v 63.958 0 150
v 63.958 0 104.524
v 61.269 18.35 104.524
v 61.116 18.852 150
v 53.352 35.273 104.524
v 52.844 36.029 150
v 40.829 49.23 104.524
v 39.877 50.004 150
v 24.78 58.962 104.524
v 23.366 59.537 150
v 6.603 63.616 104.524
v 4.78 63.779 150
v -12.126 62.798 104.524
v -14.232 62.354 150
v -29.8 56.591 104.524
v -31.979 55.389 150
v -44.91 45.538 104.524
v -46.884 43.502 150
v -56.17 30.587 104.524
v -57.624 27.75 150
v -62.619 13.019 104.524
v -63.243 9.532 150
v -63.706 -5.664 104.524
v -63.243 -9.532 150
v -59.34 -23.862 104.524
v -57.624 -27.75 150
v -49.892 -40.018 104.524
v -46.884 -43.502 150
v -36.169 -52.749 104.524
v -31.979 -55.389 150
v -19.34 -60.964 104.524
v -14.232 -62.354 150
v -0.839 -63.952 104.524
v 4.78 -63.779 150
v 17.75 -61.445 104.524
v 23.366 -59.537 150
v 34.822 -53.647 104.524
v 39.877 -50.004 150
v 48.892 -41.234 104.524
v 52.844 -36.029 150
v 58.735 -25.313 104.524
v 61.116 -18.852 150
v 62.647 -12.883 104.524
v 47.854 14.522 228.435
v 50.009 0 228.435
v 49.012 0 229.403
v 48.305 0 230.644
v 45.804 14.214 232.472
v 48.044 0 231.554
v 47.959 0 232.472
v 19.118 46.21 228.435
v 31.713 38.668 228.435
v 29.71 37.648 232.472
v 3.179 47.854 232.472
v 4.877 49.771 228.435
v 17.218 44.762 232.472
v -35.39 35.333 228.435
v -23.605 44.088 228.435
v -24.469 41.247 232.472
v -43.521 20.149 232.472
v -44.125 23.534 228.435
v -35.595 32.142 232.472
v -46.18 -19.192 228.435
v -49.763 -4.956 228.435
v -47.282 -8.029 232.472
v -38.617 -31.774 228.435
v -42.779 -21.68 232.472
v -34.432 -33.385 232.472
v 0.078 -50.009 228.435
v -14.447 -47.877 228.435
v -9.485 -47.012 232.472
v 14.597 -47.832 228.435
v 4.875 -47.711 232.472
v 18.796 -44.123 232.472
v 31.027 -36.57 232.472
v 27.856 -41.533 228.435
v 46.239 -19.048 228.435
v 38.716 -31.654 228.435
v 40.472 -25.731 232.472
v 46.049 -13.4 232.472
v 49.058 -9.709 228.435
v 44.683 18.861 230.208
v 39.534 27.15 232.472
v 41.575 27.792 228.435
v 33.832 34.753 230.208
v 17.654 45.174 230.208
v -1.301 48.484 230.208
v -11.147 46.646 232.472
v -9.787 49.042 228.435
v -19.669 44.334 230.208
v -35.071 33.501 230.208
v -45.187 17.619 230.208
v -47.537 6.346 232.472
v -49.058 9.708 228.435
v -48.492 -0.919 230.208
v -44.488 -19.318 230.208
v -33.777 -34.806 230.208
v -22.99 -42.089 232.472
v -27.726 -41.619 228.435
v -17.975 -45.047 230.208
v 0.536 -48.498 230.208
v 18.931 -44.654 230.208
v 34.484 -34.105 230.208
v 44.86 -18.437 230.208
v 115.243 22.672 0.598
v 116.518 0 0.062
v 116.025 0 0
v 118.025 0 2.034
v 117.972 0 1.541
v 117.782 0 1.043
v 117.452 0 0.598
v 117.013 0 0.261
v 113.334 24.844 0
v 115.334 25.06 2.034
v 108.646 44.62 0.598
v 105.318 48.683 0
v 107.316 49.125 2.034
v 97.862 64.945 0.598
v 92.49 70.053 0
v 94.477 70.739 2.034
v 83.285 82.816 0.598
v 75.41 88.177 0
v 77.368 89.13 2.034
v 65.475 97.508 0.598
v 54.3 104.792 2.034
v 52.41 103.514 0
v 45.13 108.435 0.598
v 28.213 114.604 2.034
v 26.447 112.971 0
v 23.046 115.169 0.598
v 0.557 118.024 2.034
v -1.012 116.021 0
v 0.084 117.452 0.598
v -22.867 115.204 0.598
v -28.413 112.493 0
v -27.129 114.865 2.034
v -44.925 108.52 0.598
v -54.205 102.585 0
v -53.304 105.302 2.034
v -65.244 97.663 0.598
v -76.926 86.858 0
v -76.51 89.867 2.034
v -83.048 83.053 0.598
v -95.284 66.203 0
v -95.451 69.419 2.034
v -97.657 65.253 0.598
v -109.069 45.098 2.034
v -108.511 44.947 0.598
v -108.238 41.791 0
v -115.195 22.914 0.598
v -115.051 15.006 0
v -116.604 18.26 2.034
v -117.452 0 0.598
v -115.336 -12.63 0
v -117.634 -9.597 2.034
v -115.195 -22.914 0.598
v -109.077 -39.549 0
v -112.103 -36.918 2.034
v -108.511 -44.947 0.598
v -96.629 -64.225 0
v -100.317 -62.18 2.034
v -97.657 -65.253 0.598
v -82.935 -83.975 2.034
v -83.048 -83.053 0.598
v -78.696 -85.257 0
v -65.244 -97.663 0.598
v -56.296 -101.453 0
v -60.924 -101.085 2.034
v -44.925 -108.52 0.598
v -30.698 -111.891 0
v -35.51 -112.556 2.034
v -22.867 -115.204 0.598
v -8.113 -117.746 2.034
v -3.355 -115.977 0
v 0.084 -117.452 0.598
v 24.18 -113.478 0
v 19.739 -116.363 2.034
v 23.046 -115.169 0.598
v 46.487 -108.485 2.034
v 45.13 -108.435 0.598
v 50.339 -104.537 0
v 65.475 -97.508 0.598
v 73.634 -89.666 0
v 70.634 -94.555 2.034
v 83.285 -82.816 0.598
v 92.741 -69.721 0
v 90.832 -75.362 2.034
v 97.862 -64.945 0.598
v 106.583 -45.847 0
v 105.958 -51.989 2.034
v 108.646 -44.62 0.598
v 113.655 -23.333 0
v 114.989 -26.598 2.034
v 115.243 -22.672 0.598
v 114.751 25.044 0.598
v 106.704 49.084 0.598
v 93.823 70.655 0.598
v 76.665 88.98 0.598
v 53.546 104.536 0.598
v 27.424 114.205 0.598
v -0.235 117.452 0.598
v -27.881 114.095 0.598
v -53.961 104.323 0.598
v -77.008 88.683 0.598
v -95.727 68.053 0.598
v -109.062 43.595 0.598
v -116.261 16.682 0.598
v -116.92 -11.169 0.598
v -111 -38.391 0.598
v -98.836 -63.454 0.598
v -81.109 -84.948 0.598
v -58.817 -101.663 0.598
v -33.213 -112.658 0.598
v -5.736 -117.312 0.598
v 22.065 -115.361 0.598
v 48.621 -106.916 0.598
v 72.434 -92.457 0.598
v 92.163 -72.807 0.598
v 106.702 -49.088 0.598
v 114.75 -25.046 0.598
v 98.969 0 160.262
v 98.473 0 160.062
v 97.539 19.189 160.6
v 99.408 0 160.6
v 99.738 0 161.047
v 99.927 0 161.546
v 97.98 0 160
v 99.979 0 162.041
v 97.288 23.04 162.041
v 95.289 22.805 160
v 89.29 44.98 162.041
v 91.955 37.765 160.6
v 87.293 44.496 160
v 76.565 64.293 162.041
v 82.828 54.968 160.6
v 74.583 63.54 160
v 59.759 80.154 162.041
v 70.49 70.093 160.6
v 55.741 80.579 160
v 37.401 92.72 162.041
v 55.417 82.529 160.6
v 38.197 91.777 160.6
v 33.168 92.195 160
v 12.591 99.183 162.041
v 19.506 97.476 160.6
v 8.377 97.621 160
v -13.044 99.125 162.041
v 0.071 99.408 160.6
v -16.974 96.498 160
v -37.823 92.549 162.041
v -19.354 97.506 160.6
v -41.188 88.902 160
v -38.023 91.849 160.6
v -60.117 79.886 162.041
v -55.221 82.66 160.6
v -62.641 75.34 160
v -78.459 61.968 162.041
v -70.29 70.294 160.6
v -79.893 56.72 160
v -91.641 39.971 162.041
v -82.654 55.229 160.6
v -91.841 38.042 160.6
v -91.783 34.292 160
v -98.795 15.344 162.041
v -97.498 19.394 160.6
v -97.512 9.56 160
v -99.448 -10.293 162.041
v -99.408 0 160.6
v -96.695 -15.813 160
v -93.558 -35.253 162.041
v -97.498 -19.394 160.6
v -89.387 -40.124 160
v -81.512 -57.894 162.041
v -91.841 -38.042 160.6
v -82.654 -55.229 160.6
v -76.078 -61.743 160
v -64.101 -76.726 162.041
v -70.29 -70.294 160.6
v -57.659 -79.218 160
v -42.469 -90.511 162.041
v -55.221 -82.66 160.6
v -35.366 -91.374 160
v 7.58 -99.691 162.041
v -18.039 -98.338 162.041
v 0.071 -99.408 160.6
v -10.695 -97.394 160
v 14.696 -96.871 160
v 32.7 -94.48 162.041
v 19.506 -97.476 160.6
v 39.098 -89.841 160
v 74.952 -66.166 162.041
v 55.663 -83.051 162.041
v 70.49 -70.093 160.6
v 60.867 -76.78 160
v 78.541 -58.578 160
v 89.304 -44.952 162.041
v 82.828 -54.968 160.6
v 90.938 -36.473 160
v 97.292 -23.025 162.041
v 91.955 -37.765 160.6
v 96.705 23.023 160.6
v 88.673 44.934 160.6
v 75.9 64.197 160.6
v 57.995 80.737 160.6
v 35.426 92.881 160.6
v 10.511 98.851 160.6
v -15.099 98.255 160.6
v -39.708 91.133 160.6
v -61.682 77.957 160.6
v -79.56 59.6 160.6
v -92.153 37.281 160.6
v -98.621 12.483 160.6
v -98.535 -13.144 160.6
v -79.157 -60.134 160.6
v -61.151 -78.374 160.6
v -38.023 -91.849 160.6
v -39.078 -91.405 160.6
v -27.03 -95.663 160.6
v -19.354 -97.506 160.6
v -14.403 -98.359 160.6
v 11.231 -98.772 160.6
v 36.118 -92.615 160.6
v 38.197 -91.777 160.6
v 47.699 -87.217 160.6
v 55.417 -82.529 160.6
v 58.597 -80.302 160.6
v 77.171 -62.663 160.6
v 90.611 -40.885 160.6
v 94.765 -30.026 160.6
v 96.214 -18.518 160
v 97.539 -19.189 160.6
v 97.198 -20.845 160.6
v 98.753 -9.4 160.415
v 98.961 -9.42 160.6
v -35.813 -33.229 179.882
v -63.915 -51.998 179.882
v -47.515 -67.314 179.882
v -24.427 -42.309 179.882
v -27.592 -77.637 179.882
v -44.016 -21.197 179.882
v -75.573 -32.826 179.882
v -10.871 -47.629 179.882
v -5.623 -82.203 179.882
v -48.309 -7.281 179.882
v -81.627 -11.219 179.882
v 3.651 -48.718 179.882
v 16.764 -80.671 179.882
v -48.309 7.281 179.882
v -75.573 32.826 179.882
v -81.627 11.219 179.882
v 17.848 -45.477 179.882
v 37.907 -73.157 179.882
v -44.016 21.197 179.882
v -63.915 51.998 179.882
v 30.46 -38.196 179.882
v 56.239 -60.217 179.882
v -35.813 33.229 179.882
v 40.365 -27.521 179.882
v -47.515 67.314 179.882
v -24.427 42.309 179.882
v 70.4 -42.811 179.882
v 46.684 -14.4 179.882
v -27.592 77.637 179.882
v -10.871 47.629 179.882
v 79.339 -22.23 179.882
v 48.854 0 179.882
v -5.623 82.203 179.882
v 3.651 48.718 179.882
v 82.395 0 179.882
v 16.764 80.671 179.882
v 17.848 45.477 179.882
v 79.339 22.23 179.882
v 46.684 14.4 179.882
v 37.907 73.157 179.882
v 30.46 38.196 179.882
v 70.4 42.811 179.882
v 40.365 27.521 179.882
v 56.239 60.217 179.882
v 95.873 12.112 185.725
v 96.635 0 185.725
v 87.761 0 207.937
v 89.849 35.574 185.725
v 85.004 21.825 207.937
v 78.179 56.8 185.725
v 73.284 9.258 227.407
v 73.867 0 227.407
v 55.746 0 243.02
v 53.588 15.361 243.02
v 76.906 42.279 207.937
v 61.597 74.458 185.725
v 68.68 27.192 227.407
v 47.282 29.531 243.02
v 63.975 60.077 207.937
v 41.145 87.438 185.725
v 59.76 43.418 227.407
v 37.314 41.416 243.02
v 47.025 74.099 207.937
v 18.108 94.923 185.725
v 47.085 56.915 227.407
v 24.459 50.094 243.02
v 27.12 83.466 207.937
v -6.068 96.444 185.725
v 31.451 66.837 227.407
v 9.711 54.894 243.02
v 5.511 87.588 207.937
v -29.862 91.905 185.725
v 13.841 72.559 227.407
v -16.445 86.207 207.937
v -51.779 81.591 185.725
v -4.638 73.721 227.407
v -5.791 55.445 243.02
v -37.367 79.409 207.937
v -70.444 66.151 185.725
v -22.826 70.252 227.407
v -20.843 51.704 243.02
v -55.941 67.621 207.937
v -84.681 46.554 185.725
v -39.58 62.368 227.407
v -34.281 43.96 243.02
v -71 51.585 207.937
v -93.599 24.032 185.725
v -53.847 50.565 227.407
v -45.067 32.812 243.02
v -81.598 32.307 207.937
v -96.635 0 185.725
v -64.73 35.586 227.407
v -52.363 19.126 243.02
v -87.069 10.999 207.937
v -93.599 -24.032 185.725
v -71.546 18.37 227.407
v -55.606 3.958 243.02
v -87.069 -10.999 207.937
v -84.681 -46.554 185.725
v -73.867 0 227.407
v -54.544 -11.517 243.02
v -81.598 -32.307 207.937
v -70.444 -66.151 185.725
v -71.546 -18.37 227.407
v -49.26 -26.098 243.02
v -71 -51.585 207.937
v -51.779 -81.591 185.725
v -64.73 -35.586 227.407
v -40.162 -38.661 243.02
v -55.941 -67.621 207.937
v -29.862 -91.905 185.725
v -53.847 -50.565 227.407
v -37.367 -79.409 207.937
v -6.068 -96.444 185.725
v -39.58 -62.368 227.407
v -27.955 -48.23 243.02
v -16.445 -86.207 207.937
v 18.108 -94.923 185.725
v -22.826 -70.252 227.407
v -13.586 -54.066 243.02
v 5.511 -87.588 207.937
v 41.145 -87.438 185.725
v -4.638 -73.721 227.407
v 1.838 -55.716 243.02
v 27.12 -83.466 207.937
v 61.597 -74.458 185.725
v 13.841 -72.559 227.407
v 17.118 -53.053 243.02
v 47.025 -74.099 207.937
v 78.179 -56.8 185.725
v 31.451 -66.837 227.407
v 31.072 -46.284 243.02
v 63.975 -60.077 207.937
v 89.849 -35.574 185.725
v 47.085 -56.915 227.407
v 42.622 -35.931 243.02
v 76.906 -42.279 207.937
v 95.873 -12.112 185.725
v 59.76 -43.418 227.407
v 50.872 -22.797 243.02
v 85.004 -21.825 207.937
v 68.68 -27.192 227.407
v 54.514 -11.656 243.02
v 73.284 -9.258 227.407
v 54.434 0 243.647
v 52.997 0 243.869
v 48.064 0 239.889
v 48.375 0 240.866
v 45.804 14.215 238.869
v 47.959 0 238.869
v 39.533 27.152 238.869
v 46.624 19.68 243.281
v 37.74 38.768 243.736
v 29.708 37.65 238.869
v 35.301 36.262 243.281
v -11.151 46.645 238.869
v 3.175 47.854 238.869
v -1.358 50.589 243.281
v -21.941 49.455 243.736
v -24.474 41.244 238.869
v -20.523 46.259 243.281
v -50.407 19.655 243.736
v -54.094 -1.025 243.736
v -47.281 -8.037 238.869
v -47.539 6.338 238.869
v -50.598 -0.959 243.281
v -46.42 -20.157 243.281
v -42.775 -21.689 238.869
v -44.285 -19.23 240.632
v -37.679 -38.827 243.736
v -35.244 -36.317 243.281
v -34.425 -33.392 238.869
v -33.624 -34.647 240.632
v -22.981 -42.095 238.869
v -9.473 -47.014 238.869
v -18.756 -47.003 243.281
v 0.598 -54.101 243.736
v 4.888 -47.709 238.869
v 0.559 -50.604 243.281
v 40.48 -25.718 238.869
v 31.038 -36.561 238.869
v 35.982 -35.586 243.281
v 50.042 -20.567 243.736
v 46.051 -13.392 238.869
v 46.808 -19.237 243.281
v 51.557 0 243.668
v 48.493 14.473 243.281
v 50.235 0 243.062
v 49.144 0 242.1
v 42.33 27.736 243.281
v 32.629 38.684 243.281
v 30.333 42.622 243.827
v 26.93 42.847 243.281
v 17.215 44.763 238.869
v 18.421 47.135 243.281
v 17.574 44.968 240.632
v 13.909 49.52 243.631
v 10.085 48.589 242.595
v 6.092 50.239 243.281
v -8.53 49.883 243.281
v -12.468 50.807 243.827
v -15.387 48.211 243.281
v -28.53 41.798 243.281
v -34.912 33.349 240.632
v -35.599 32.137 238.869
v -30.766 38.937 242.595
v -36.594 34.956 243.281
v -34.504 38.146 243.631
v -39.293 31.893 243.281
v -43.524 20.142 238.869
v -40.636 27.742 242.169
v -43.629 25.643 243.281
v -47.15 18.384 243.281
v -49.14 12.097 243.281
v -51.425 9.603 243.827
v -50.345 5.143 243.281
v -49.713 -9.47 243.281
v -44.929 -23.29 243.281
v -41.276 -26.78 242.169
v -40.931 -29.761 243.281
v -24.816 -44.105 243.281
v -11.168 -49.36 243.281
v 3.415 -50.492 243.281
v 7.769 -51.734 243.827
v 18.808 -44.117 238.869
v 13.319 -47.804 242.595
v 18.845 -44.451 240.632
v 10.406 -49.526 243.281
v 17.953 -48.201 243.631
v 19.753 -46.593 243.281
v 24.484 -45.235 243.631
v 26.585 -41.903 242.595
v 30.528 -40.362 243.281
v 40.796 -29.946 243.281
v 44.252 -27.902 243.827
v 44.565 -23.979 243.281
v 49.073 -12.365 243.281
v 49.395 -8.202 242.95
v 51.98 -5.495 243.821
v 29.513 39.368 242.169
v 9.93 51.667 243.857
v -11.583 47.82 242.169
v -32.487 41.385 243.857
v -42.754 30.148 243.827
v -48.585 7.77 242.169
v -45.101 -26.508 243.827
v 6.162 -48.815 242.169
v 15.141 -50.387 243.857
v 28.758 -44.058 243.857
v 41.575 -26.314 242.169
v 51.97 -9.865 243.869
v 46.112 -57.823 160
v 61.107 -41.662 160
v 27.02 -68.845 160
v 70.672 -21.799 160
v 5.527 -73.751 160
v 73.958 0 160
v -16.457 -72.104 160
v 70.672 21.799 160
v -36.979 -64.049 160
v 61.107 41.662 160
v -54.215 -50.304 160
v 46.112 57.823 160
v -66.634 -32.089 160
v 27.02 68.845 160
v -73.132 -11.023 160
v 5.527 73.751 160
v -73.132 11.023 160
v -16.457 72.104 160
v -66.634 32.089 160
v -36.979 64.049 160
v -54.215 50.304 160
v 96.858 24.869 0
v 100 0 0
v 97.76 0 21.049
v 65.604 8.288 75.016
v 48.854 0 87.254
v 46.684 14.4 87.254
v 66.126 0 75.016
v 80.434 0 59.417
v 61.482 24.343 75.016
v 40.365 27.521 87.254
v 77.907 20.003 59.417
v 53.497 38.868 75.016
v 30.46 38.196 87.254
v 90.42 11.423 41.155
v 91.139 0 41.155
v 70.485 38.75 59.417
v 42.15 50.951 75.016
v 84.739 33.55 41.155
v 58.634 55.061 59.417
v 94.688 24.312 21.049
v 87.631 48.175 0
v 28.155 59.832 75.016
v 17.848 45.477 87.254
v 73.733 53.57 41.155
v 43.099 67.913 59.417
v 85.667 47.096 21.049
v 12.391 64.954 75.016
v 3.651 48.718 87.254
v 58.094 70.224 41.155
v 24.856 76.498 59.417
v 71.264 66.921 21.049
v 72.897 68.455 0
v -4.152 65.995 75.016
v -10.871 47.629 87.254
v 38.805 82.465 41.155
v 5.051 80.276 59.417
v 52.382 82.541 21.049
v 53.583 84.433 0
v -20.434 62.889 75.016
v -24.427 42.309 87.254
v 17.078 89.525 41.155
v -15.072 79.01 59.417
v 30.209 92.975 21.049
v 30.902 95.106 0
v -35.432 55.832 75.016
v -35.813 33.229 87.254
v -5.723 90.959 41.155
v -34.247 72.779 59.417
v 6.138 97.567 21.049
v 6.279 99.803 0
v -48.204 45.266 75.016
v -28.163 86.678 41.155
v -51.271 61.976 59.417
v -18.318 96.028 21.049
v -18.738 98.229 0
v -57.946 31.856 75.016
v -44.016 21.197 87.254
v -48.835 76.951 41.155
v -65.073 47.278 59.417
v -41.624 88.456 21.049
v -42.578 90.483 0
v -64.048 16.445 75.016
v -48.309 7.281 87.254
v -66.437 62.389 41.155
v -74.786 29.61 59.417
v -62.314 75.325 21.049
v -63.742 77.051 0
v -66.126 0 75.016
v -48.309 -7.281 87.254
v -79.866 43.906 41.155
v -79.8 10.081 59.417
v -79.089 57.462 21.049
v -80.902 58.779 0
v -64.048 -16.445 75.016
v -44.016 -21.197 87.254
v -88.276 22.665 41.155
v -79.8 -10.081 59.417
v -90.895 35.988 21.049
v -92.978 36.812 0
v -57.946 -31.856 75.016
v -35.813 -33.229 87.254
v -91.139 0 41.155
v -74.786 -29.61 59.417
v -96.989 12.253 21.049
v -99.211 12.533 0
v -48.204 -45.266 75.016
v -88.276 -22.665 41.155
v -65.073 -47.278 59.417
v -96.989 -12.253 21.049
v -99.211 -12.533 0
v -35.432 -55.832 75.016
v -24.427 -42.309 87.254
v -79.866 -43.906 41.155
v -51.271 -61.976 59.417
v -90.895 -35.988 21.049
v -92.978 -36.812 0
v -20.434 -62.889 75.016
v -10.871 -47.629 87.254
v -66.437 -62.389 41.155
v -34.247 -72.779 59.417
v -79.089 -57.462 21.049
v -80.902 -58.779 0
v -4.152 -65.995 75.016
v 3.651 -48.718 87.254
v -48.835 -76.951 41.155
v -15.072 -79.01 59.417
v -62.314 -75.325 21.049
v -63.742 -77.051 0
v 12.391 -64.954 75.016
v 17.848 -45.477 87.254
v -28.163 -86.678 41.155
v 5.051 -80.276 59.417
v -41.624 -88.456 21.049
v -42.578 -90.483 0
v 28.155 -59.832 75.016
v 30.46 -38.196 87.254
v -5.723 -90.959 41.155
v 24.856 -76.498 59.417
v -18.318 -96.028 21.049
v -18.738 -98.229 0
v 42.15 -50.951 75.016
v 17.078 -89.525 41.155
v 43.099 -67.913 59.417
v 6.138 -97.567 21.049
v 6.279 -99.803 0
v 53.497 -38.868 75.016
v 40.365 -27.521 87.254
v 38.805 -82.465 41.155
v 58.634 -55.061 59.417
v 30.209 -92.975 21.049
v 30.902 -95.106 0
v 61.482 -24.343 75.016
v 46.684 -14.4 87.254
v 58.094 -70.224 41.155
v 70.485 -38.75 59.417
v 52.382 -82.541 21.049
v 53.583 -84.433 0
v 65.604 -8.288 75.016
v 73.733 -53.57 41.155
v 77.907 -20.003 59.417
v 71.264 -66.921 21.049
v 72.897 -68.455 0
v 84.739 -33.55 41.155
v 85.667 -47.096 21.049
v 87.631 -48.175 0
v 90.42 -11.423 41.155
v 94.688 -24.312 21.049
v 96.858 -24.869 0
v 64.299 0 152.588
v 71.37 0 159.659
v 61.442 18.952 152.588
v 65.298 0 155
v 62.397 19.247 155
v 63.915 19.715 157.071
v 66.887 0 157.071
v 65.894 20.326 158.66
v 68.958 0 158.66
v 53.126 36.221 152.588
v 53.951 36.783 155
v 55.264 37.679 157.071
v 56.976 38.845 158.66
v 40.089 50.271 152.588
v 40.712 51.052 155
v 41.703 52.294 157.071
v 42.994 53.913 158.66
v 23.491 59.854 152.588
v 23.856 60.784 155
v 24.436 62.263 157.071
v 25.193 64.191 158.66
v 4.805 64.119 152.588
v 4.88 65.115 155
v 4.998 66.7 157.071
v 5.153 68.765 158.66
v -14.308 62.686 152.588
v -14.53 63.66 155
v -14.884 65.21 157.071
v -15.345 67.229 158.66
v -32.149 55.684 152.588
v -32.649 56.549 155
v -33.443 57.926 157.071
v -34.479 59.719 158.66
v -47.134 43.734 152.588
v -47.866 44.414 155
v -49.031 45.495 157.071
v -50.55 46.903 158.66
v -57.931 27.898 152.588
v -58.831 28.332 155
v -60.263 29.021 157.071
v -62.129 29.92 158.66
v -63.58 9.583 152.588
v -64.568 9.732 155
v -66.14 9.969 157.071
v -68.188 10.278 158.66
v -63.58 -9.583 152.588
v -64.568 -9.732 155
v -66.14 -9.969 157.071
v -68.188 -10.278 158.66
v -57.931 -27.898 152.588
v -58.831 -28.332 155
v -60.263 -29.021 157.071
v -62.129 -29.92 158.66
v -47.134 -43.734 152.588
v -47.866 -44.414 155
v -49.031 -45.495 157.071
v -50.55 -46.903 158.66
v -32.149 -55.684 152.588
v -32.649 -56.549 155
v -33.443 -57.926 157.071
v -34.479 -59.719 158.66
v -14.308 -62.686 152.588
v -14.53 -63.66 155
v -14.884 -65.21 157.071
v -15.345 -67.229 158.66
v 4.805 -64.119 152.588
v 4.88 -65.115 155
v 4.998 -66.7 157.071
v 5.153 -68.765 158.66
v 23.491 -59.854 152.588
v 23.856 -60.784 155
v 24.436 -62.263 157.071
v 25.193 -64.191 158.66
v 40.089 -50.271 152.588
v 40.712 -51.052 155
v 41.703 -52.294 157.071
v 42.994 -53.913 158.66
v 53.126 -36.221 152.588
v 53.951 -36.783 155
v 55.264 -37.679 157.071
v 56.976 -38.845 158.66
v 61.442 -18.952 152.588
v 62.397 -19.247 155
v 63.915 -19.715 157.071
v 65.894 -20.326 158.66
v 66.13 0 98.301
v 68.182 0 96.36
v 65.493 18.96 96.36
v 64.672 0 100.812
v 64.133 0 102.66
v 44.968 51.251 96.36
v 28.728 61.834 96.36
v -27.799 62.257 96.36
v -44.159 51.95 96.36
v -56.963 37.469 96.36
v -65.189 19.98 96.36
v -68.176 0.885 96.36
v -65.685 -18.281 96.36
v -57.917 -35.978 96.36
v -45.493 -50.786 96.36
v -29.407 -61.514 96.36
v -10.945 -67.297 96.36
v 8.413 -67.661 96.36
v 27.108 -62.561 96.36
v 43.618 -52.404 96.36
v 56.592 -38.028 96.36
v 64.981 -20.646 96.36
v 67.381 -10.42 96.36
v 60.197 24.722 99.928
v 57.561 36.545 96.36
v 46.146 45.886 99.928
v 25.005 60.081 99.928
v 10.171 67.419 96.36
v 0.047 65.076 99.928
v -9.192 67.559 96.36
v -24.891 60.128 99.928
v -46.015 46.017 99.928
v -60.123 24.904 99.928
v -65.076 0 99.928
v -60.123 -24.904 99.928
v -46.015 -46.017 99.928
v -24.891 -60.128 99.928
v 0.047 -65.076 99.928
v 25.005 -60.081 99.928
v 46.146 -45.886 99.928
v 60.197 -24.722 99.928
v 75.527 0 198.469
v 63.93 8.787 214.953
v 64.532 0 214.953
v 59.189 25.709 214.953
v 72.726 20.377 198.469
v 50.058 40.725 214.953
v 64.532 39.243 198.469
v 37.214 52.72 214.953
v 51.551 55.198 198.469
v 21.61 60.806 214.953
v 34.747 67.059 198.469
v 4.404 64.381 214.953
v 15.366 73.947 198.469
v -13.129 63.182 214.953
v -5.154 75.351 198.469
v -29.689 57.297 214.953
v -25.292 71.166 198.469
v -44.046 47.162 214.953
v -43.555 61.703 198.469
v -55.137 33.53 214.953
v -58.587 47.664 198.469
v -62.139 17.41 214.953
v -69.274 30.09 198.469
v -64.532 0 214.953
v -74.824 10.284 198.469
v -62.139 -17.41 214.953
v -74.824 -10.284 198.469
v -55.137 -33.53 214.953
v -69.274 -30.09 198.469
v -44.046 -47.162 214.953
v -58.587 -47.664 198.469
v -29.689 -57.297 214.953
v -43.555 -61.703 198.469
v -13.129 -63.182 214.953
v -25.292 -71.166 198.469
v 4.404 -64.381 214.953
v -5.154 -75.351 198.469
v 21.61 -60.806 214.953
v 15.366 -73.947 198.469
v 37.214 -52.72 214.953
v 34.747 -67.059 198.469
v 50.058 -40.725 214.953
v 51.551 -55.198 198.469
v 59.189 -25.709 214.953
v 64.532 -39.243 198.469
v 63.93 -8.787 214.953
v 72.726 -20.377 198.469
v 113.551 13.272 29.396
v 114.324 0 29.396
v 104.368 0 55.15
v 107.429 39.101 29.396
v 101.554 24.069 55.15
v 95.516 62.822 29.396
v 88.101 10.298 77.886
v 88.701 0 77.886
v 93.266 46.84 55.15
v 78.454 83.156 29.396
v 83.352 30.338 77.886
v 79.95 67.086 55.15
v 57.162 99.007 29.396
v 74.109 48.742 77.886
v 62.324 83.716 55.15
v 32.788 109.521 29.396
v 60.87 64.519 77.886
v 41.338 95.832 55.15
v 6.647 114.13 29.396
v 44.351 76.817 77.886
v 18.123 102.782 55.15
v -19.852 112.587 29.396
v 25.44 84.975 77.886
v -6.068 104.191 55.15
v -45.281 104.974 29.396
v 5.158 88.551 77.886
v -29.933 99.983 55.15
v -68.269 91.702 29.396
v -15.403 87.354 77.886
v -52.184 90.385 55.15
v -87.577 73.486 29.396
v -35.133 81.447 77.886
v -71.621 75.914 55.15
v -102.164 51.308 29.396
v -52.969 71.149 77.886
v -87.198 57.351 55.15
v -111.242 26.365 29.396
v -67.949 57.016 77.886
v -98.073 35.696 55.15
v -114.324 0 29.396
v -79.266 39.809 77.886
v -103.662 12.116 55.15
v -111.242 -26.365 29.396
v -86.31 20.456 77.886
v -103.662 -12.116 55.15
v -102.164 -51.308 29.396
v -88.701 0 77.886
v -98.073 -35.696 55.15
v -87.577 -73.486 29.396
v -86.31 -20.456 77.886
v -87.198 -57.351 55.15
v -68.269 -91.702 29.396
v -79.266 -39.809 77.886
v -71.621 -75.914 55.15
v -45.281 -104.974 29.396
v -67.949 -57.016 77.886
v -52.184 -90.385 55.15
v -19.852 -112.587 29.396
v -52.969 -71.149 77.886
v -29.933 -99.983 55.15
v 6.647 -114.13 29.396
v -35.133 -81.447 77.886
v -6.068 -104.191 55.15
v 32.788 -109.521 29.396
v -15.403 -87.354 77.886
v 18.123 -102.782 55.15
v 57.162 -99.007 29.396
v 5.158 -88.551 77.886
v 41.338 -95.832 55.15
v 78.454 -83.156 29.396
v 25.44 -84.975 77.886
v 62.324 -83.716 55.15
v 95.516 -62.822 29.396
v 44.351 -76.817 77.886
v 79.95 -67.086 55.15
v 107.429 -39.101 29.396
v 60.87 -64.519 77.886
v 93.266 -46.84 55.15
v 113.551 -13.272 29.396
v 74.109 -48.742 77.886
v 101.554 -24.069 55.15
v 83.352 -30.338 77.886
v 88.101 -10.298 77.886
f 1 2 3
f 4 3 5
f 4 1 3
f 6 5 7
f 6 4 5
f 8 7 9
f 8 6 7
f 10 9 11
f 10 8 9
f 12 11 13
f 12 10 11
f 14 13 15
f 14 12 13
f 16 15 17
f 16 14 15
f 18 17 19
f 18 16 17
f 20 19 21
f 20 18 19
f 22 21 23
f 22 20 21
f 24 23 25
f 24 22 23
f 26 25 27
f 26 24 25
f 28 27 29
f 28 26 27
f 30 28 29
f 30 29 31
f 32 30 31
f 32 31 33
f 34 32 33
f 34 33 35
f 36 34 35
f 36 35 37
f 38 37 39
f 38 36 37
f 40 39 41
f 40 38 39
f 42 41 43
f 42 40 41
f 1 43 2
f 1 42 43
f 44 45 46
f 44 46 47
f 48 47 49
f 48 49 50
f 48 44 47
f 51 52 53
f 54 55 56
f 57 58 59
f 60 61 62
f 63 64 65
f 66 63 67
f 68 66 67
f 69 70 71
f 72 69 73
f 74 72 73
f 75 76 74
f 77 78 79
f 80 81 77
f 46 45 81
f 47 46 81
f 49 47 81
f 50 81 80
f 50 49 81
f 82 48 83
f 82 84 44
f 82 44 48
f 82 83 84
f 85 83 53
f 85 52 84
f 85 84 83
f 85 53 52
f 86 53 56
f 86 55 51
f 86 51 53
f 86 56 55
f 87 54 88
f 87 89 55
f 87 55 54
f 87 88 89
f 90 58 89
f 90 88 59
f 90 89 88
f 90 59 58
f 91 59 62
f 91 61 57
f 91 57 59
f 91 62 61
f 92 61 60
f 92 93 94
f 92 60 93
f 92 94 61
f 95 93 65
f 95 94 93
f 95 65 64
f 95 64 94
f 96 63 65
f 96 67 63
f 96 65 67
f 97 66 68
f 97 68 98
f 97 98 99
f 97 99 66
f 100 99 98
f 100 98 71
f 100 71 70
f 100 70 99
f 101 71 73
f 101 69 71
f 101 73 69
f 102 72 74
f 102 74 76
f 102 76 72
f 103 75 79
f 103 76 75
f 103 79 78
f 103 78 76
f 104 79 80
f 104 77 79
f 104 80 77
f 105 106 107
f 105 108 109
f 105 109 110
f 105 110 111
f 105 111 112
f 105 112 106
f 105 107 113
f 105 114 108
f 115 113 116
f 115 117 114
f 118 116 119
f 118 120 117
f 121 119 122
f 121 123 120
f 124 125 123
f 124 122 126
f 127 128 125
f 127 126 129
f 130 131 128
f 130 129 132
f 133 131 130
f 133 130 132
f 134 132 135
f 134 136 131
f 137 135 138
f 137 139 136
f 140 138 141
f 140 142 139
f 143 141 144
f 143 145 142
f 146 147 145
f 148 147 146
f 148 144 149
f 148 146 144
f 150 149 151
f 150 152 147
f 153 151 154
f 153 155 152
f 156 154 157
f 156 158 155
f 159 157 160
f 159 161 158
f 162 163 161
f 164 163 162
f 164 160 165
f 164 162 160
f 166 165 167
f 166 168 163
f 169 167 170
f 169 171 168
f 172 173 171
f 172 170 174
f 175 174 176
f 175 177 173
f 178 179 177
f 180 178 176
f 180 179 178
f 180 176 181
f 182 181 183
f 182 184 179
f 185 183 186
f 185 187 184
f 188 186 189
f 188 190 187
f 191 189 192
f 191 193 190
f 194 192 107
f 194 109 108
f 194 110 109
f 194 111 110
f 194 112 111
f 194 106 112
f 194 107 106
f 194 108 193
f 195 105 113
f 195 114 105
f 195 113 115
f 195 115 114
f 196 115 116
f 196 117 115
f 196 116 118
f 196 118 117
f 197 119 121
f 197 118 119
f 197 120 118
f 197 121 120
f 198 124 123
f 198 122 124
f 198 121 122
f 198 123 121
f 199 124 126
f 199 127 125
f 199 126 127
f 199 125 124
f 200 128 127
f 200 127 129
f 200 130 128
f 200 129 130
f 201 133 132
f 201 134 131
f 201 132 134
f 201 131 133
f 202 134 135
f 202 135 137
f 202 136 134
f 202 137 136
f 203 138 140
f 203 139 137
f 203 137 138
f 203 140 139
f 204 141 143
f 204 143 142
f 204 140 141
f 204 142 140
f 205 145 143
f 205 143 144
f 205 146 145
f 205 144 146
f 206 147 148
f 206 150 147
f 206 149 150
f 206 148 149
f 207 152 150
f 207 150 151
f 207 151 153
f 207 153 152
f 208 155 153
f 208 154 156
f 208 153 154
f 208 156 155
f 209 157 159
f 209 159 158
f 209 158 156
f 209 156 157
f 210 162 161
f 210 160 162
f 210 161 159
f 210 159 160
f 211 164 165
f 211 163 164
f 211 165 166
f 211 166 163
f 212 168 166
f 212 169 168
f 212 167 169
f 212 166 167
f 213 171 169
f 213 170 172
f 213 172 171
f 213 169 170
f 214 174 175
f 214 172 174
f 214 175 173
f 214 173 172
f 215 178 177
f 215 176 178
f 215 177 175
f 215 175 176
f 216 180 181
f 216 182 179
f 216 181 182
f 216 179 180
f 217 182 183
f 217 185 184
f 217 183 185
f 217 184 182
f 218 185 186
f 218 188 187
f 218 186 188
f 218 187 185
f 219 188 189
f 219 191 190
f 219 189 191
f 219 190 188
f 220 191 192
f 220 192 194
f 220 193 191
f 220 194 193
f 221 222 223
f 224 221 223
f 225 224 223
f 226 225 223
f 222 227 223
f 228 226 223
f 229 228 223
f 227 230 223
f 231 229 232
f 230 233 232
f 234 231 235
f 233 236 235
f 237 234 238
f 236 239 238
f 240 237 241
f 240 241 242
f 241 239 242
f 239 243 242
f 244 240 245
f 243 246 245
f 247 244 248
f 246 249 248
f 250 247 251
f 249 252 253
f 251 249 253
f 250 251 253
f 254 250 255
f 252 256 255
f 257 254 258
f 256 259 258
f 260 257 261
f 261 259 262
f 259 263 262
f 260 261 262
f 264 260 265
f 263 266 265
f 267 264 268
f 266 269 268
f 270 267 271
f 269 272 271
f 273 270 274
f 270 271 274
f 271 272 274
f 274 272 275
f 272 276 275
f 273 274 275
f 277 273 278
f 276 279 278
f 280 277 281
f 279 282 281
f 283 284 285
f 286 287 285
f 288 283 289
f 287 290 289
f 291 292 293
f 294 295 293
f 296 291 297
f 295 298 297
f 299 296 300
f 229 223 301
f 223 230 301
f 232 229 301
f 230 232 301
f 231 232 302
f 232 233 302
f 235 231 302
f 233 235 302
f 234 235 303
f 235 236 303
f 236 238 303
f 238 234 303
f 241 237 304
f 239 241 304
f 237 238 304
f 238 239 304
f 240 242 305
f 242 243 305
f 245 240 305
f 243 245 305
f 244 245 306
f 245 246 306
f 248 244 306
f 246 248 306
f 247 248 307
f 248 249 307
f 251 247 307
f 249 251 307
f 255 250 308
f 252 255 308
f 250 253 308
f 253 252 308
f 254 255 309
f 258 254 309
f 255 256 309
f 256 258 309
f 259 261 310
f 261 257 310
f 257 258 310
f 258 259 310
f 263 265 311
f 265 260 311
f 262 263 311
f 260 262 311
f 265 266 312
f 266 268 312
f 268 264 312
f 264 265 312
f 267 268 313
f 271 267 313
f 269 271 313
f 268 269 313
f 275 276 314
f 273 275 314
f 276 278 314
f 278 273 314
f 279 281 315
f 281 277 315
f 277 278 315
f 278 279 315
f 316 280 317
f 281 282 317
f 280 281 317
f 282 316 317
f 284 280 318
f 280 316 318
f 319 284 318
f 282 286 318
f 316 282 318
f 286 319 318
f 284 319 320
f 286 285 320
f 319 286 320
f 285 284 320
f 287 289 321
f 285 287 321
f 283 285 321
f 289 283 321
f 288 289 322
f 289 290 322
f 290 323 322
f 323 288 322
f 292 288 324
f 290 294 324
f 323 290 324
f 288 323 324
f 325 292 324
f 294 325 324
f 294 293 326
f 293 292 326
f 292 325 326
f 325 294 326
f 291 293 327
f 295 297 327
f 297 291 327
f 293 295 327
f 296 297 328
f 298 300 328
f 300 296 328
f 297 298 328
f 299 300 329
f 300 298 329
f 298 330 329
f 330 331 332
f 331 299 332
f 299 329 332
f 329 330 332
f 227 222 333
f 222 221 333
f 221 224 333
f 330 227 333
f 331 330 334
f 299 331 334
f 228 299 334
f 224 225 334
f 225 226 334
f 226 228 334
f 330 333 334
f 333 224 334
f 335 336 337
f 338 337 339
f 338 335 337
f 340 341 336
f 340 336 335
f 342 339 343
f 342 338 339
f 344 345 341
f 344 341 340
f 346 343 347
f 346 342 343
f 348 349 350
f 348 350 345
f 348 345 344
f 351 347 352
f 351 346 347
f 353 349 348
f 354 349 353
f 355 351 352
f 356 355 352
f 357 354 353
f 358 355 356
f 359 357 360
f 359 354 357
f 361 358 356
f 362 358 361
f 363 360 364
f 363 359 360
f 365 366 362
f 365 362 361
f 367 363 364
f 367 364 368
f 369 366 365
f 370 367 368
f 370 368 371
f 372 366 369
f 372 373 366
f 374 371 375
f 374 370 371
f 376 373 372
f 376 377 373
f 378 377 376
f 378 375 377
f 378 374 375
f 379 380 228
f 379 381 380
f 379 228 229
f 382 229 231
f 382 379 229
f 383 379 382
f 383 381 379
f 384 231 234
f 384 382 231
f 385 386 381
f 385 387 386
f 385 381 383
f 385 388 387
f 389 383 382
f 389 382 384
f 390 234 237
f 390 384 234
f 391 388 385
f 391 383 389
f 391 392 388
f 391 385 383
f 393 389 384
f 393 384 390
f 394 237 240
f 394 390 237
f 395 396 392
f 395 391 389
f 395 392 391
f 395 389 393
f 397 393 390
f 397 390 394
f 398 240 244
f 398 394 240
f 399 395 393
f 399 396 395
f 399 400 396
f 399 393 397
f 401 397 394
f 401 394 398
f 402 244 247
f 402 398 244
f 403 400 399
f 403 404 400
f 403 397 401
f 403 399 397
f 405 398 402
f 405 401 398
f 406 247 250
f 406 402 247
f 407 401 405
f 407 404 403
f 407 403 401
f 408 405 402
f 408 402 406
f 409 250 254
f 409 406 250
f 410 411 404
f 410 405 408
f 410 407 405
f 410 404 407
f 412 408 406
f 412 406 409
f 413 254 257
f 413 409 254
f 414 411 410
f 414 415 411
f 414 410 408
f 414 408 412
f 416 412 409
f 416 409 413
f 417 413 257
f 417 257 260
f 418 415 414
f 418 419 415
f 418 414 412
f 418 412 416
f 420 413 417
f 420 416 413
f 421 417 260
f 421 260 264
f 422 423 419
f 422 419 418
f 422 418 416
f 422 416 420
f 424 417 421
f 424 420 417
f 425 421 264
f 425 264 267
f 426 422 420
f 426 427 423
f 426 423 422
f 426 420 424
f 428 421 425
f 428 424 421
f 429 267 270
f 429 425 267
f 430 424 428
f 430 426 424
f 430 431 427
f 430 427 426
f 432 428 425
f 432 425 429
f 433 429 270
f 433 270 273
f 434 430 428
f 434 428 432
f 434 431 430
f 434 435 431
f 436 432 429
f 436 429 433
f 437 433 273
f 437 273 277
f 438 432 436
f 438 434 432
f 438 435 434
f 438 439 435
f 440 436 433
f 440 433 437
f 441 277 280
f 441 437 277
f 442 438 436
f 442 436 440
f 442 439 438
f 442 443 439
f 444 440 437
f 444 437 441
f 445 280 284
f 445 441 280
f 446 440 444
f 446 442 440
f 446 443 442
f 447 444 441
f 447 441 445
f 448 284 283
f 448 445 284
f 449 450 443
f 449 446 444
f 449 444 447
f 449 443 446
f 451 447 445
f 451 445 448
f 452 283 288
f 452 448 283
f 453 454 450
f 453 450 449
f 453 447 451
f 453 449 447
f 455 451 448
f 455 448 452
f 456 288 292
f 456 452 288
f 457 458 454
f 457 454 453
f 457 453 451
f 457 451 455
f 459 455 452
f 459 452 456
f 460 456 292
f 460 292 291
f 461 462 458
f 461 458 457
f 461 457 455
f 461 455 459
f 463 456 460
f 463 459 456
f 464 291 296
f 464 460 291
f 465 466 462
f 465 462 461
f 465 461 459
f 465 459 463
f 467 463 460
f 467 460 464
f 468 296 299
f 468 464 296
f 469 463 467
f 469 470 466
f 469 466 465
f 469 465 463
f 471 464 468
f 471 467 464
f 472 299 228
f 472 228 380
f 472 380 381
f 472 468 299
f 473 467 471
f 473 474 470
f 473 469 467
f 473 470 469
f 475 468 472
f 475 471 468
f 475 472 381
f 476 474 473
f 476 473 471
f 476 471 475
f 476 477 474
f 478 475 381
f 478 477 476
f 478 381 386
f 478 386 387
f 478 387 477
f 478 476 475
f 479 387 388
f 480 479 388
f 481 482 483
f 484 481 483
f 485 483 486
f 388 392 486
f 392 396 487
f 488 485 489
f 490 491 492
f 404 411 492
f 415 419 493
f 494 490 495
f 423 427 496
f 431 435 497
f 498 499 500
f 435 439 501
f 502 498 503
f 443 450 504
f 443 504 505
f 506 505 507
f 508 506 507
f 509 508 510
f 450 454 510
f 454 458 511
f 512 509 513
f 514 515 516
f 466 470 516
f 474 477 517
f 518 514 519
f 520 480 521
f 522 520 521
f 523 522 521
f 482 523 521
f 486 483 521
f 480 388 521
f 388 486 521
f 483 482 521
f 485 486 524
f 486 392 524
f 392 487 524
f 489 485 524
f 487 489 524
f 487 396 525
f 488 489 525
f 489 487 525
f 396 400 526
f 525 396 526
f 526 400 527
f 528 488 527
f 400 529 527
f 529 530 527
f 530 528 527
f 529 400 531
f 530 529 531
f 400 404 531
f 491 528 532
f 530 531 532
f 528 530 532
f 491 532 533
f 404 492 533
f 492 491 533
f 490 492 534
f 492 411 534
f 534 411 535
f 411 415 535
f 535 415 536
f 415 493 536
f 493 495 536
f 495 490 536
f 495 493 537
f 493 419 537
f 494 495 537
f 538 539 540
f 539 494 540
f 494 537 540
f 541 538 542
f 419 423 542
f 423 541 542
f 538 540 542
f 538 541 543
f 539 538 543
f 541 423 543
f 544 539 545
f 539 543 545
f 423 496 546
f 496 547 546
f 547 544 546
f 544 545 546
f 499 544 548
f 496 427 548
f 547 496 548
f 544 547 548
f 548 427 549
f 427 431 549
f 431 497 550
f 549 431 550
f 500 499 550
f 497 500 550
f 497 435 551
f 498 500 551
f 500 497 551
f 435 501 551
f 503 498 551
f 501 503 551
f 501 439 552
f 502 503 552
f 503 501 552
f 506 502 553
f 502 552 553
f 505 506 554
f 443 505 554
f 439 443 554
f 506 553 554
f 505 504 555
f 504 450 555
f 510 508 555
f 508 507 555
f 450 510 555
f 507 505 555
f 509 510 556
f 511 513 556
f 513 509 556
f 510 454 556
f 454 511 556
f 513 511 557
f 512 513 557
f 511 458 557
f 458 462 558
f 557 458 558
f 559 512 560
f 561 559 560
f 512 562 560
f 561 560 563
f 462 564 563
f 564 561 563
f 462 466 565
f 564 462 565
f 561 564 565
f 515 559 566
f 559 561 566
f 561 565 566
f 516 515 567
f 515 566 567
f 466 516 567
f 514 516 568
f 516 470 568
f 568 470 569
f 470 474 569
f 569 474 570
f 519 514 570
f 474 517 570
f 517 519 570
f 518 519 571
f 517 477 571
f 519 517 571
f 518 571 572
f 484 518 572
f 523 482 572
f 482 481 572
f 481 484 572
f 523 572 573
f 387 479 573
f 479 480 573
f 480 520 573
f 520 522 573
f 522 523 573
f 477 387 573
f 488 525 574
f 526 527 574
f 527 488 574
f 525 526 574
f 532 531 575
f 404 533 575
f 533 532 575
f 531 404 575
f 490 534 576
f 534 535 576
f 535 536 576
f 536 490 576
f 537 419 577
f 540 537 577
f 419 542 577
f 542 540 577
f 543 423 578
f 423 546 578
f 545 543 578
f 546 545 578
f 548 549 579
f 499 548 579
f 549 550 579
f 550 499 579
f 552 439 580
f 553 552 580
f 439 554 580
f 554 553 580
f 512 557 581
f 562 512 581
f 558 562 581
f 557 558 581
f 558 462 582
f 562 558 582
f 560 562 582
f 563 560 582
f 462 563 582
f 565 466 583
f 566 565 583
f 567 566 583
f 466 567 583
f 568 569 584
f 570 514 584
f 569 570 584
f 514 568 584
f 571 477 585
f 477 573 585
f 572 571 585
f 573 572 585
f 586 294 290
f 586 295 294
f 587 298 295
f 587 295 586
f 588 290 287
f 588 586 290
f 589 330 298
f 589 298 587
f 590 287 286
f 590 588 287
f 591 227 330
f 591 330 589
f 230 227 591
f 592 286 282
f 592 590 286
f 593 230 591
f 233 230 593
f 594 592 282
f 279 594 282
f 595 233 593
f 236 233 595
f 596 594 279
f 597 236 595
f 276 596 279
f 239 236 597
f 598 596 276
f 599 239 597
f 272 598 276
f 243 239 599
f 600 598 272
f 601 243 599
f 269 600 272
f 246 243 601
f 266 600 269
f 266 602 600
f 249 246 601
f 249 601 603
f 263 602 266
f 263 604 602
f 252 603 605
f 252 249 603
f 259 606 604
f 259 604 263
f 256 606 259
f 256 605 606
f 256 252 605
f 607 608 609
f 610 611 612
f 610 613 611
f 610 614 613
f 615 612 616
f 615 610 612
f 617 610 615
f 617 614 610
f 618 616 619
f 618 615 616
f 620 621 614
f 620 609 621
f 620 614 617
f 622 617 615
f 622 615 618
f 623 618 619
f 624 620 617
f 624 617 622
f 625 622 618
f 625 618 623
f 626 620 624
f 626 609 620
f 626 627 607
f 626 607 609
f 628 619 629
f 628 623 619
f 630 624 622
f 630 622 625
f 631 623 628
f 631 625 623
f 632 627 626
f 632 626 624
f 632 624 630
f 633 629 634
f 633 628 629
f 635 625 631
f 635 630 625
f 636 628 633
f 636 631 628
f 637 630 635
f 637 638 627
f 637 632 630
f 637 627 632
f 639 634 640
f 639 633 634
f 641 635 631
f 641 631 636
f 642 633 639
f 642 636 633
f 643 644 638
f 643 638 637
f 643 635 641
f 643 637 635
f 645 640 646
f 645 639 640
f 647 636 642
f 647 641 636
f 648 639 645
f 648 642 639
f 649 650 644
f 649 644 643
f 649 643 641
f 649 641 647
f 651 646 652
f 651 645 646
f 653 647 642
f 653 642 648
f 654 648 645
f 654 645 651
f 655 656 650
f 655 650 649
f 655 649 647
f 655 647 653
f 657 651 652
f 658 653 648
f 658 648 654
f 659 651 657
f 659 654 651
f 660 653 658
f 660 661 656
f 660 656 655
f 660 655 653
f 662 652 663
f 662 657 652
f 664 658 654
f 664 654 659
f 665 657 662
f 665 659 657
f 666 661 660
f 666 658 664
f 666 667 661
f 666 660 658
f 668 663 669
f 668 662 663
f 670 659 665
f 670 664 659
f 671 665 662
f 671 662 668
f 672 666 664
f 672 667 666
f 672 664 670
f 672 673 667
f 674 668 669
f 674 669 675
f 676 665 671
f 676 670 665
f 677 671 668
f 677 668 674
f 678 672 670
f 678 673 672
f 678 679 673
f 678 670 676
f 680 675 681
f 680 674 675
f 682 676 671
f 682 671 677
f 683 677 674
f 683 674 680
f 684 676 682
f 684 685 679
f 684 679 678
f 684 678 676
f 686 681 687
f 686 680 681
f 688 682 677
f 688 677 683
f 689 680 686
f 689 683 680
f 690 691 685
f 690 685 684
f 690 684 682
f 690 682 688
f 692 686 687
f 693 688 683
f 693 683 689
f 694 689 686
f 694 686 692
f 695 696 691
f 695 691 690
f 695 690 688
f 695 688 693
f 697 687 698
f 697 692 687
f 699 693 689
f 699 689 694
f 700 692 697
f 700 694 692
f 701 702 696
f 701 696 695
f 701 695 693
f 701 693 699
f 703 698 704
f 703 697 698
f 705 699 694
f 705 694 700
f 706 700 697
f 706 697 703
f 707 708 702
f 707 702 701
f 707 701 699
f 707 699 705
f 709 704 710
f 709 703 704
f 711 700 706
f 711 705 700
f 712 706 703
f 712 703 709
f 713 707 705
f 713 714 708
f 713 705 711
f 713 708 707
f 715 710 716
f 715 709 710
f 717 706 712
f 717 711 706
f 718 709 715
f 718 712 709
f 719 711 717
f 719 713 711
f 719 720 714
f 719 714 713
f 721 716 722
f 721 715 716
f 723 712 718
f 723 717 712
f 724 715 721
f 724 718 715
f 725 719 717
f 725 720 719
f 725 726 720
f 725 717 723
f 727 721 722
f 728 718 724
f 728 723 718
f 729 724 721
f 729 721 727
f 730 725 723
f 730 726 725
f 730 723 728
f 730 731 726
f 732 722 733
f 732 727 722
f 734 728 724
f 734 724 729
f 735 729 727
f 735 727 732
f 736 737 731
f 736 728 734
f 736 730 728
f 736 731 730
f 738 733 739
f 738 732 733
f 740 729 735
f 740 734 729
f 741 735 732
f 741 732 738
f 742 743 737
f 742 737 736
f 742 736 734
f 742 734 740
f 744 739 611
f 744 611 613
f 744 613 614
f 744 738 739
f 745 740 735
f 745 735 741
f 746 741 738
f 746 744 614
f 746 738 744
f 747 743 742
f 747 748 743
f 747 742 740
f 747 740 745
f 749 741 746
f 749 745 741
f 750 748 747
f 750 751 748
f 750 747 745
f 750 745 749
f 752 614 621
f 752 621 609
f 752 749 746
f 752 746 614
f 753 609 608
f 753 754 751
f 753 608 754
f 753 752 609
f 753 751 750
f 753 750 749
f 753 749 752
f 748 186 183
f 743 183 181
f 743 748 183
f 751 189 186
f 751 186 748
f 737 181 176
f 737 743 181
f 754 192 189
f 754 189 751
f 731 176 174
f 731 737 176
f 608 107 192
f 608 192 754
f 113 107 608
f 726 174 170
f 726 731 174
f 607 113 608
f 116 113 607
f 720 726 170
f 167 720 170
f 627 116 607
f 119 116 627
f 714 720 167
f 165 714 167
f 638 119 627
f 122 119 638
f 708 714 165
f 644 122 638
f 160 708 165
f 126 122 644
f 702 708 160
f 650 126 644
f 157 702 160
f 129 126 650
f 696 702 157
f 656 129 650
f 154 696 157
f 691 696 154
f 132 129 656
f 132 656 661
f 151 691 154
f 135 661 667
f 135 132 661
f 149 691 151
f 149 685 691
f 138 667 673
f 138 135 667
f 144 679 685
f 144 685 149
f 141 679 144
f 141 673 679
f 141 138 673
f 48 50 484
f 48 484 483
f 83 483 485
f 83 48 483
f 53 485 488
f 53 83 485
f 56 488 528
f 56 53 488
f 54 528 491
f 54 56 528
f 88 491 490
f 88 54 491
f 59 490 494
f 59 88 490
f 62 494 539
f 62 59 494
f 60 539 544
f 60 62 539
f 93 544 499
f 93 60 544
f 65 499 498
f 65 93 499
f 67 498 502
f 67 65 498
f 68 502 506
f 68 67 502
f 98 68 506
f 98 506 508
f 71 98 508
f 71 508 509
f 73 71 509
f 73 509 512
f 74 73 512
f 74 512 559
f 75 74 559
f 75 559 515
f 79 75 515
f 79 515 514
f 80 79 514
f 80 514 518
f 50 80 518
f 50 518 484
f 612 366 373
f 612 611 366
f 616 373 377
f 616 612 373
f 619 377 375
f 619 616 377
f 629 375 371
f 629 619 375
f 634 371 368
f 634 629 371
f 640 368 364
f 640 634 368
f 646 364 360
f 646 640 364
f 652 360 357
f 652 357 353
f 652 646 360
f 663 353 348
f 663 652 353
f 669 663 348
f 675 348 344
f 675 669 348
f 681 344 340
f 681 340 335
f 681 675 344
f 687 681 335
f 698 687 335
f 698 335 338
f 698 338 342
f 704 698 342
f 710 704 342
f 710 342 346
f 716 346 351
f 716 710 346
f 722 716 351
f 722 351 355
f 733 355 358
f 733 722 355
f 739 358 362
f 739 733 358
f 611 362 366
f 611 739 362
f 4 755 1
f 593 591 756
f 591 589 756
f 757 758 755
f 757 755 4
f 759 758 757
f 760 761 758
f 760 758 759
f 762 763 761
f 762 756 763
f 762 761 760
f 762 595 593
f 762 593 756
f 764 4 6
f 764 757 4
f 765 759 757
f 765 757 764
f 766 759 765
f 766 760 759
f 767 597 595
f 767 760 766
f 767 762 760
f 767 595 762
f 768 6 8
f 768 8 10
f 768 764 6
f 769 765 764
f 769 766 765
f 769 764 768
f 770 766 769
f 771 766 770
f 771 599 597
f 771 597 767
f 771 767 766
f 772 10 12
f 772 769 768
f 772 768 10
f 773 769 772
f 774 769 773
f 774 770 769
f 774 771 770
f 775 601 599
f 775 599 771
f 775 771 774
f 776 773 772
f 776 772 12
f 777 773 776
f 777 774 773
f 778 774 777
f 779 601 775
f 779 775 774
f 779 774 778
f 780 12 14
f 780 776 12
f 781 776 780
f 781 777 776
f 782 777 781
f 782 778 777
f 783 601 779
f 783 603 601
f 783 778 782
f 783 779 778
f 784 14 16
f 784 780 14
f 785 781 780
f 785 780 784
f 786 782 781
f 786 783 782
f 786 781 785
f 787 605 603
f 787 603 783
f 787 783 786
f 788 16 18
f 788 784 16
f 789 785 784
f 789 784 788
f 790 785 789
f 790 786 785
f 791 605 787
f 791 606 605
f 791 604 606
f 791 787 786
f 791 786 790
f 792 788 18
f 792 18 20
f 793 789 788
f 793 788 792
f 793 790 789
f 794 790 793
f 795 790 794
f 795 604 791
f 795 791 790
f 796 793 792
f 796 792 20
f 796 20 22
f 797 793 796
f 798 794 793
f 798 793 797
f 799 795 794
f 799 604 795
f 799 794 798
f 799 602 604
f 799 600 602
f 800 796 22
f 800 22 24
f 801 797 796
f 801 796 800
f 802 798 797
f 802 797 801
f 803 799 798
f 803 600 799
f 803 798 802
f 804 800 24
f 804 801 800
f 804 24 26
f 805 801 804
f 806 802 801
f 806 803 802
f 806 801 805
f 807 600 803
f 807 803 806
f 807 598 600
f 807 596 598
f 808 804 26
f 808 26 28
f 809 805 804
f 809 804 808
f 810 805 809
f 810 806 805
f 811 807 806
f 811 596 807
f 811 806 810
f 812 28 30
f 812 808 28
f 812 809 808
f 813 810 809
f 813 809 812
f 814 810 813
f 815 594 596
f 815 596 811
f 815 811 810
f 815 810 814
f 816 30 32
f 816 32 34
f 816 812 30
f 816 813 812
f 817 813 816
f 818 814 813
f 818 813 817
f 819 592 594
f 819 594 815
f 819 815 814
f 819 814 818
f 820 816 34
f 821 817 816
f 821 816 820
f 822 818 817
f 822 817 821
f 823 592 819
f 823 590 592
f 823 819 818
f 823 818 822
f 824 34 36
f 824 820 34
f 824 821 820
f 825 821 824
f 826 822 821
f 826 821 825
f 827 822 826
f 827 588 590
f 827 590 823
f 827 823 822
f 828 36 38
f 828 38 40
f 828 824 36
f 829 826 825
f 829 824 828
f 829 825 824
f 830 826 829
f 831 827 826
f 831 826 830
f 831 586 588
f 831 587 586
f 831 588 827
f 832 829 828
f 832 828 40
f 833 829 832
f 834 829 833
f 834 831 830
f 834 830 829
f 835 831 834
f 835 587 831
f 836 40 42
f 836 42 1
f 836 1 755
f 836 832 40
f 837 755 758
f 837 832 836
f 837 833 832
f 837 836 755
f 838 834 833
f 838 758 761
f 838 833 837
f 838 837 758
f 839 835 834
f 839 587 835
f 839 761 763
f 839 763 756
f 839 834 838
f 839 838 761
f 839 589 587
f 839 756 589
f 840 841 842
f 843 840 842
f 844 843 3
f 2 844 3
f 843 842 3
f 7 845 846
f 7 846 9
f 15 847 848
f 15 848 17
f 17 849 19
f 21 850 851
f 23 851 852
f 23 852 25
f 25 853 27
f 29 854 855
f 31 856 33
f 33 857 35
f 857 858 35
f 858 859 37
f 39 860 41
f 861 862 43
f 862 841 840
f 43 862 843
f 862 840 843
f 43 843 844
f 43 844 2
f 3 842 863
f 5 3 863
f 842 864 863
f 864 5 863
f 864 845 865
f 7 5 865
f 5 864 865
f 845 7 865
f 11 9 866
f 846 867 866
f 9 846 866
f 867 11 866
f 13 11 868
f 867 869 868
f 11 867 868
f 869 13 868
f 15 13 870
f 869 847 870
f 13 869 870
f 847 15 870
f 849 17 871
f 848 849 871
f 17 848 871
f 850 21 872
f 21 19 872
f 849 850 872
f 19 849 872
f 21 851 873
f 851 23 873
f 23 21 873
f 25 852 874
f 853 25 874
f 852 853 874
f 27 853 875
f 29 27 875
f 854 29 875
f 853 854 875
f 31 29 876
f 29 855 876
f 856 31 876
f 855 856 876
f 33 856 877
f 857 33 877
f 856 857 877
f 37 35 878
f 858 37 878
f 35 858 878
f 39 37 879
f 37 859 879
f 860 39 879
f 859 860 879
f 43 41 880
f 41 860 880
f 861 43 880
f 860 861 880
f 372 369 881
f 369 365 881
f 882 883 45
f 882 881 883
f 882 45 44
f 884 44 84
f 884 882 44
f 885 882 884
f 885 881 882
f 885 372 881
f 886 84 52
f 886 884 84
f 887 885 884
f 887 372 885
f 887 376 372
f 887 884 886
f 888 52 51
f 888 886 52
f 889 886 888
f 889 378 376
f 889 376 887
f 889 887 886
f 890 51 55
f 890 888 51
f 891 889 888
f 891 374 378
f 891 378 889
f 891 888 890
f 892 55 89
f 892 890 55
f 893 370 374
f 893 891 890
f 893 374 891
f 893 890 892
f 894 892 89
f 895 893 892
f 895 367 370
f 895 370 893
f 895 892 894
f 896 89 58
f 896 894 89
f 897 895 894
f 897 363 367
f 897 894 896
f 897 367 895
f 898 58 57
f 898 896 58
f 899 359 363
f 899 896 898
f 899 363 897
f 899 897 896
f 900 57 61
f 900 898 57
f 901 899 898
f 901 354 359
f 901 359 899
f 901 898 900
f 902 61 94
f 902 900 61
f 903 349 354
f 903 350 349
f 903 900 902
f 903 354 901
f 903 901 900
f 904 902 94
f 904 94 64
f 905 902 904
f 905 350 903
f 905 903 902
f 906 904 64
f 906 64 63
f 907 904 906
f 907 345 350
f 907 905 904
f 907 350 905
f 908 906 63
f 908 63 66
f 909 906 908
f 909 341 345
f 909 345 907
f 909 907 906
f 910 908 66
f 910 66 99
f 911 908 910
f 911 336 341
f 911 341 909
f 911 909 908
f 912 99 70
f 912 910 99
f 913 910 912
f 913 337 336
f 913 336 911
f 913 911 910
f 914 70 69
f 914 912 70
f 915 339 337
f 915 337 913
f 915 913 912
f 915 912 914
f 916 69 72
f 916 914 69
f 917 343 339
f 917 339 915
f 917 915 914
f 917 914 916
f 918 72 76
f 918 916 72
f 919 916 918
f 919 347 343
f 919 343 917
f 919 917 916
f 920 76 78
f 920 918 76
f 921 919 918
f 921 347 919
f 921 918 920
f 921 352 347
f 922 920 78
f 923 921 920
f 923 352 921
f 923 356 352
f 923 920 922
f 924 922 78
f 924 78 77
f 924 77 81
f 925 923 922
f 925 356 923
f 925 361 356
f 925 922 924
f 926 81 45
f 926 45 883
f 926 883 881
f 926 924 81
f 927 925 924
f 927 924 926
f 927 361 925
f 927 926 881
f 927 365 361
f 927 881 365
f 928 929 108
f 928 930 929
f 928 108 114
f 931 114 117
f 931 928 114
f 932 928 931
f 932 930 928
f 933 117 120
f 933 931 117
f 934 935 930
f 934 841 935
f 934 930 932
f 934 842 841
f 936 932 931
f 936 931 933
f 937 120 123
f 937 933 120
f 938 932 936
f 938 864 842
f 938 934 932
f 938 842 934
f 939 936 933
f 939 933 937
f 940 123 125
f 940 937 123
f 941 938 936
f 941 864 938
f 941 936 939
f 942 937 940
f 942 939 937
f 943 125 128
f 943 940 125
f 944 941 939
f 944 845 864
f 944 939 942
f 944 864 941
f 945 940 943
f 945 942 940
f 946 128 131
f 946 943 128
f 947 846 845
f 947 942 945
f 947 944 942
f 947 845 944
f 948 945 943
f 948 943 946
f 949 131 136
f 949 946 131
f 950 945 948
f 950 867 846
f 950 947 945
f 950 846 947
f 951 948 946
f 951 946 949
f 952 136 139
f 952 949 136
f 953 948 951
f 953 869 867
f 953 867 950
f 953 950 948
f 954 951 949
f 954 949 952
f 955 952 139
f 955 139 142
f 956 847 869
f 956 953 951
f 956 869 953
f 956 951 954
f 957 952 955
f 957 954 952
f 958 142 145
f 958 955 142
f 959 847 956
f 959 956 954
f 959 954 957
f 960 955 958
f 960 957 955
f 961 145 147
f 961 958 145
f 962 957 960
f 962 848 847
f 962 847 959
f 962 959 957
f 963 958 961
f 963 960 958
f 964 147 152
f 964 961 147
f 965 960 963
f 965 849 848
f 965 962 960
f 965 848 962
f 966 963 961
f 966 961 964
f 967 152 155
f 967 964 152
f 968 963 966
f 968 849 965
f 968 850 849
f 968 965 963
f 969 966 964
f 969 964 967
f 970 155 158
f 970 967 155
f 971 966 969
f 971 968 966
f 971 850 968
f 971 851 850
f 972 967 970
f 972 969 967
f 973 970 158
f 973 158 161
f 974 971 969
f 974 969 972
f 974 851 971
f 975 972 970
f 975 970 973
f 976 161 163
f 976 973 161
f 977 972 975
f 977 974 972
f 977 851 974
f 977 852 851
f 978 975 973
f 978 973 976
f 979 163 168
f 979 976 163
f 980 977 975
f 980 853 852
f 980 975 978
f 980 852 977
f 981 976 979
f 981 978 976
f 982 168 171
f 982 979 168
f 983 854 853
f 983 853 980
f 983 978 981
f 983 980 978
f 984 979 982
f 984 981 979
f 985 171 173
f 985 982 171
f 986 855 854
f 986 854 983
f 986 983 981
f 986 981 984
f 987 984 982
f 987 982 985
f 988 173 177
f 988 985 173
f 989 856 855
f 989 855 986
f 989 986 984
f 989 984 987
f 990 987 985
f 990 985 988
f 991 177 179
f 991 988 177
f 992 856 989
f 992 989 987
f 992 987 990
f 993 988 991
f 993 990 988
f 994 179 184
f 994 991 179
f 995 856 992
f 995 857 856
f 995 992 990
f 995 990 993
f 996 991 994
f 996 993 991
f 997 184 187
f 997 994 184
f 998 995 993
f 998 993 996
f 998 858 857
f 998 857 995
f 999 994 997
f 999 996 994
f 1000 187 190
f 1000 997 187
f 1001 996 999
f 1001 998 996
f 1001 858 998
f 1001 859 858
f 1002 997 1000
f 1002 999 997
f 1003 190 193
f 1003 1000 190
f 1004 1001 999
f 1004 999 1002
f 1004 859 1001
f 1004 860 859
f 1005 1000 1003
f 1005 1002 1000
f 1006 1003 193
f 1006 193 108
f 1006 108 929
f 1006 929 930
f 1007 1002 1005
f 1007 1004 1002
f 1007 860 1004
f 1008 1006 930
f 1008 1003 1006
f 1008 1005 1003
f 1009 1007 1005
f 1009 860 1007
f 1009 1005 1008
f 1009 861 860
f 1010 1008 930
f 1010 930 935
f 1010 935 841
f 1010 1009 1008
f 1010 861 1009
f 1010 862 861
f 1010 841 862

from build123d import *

# Parameters (mm, degrees)
F2_R     = 47.9591692075
F3_DEPTH = 261
F4_R     = 10
F5_R     = 2
F6_R     = 5


with BuildPart() as f1:
    # F0 (on Front) → F1 (revolve)
    with BuildSketch(Plane.XZ):
        with BuildLine():
            ThreePointArc((48.8541781645, 87.2540501975), (86.2711360087, 50.5696657273), (100, 0))
            Line((100, 0), (118.0426776409, 0))
            ThreePointArc((118.0426776409, 0), (103.6431915325, 56.4992264868), (63.9577880502, 99.214288751))
            Line((63.9577880502, 99.214288751), (63.9577880502, 160))
            Line((63.9577880502, 160), (100, 160))
            ThreePointArc((100, 160), (70.7106781187, 230.7106781187), (0, 260))
            Line((0, 260), (0, 244.7596675158))
            ThreePointArc((0, 244.7596675158), (52.4356930146, 226.5935382411), (82.3948094726, 179.8820675321))
            Line((82.3948094726, 179.8820675321), (48.8541781645, 179.8820675321))
            Line((48.8541781645, 179.8820675321), (48.8541781645, 87.2540501975))
        make_face()
    revolve(axis=Axis((0, 0, 80), (0, 0, 1)))

    # F2 (on Top) → F3 (cut)
    with BuildSketch(Plane.XY):
        Circle(F2_R)
    extrude(amount=F3_DEPTH, mode=Mode.SUBTRACT)

    # F4
    f4_edges = [f1.edges().sort_by_distance(p)[0] for p in [
        (-63.957788, 0, 160),
        (-63.957788, 0, 99.214289),
    ]]
    fillet(f4_edges, radius=F4_R)

    # F5
    f5_edges = [f1.edges().sort_by_distance(p)[0] for p in [
        (-100, 0, 160),
        (-118.042678, 0, 0),
    ]]
    fillet(f5_edges, radius=F5_R)

    # F6
    f6_edges = [f1.edges().sort_by_distance(p)[0] for p in [
        (-47.959169, 0, 229.886475),
        (-47.959169, 0, 247.749177),
    ]]
    fillet(f6_edges, radius=F6_R)


solid = f1.part
